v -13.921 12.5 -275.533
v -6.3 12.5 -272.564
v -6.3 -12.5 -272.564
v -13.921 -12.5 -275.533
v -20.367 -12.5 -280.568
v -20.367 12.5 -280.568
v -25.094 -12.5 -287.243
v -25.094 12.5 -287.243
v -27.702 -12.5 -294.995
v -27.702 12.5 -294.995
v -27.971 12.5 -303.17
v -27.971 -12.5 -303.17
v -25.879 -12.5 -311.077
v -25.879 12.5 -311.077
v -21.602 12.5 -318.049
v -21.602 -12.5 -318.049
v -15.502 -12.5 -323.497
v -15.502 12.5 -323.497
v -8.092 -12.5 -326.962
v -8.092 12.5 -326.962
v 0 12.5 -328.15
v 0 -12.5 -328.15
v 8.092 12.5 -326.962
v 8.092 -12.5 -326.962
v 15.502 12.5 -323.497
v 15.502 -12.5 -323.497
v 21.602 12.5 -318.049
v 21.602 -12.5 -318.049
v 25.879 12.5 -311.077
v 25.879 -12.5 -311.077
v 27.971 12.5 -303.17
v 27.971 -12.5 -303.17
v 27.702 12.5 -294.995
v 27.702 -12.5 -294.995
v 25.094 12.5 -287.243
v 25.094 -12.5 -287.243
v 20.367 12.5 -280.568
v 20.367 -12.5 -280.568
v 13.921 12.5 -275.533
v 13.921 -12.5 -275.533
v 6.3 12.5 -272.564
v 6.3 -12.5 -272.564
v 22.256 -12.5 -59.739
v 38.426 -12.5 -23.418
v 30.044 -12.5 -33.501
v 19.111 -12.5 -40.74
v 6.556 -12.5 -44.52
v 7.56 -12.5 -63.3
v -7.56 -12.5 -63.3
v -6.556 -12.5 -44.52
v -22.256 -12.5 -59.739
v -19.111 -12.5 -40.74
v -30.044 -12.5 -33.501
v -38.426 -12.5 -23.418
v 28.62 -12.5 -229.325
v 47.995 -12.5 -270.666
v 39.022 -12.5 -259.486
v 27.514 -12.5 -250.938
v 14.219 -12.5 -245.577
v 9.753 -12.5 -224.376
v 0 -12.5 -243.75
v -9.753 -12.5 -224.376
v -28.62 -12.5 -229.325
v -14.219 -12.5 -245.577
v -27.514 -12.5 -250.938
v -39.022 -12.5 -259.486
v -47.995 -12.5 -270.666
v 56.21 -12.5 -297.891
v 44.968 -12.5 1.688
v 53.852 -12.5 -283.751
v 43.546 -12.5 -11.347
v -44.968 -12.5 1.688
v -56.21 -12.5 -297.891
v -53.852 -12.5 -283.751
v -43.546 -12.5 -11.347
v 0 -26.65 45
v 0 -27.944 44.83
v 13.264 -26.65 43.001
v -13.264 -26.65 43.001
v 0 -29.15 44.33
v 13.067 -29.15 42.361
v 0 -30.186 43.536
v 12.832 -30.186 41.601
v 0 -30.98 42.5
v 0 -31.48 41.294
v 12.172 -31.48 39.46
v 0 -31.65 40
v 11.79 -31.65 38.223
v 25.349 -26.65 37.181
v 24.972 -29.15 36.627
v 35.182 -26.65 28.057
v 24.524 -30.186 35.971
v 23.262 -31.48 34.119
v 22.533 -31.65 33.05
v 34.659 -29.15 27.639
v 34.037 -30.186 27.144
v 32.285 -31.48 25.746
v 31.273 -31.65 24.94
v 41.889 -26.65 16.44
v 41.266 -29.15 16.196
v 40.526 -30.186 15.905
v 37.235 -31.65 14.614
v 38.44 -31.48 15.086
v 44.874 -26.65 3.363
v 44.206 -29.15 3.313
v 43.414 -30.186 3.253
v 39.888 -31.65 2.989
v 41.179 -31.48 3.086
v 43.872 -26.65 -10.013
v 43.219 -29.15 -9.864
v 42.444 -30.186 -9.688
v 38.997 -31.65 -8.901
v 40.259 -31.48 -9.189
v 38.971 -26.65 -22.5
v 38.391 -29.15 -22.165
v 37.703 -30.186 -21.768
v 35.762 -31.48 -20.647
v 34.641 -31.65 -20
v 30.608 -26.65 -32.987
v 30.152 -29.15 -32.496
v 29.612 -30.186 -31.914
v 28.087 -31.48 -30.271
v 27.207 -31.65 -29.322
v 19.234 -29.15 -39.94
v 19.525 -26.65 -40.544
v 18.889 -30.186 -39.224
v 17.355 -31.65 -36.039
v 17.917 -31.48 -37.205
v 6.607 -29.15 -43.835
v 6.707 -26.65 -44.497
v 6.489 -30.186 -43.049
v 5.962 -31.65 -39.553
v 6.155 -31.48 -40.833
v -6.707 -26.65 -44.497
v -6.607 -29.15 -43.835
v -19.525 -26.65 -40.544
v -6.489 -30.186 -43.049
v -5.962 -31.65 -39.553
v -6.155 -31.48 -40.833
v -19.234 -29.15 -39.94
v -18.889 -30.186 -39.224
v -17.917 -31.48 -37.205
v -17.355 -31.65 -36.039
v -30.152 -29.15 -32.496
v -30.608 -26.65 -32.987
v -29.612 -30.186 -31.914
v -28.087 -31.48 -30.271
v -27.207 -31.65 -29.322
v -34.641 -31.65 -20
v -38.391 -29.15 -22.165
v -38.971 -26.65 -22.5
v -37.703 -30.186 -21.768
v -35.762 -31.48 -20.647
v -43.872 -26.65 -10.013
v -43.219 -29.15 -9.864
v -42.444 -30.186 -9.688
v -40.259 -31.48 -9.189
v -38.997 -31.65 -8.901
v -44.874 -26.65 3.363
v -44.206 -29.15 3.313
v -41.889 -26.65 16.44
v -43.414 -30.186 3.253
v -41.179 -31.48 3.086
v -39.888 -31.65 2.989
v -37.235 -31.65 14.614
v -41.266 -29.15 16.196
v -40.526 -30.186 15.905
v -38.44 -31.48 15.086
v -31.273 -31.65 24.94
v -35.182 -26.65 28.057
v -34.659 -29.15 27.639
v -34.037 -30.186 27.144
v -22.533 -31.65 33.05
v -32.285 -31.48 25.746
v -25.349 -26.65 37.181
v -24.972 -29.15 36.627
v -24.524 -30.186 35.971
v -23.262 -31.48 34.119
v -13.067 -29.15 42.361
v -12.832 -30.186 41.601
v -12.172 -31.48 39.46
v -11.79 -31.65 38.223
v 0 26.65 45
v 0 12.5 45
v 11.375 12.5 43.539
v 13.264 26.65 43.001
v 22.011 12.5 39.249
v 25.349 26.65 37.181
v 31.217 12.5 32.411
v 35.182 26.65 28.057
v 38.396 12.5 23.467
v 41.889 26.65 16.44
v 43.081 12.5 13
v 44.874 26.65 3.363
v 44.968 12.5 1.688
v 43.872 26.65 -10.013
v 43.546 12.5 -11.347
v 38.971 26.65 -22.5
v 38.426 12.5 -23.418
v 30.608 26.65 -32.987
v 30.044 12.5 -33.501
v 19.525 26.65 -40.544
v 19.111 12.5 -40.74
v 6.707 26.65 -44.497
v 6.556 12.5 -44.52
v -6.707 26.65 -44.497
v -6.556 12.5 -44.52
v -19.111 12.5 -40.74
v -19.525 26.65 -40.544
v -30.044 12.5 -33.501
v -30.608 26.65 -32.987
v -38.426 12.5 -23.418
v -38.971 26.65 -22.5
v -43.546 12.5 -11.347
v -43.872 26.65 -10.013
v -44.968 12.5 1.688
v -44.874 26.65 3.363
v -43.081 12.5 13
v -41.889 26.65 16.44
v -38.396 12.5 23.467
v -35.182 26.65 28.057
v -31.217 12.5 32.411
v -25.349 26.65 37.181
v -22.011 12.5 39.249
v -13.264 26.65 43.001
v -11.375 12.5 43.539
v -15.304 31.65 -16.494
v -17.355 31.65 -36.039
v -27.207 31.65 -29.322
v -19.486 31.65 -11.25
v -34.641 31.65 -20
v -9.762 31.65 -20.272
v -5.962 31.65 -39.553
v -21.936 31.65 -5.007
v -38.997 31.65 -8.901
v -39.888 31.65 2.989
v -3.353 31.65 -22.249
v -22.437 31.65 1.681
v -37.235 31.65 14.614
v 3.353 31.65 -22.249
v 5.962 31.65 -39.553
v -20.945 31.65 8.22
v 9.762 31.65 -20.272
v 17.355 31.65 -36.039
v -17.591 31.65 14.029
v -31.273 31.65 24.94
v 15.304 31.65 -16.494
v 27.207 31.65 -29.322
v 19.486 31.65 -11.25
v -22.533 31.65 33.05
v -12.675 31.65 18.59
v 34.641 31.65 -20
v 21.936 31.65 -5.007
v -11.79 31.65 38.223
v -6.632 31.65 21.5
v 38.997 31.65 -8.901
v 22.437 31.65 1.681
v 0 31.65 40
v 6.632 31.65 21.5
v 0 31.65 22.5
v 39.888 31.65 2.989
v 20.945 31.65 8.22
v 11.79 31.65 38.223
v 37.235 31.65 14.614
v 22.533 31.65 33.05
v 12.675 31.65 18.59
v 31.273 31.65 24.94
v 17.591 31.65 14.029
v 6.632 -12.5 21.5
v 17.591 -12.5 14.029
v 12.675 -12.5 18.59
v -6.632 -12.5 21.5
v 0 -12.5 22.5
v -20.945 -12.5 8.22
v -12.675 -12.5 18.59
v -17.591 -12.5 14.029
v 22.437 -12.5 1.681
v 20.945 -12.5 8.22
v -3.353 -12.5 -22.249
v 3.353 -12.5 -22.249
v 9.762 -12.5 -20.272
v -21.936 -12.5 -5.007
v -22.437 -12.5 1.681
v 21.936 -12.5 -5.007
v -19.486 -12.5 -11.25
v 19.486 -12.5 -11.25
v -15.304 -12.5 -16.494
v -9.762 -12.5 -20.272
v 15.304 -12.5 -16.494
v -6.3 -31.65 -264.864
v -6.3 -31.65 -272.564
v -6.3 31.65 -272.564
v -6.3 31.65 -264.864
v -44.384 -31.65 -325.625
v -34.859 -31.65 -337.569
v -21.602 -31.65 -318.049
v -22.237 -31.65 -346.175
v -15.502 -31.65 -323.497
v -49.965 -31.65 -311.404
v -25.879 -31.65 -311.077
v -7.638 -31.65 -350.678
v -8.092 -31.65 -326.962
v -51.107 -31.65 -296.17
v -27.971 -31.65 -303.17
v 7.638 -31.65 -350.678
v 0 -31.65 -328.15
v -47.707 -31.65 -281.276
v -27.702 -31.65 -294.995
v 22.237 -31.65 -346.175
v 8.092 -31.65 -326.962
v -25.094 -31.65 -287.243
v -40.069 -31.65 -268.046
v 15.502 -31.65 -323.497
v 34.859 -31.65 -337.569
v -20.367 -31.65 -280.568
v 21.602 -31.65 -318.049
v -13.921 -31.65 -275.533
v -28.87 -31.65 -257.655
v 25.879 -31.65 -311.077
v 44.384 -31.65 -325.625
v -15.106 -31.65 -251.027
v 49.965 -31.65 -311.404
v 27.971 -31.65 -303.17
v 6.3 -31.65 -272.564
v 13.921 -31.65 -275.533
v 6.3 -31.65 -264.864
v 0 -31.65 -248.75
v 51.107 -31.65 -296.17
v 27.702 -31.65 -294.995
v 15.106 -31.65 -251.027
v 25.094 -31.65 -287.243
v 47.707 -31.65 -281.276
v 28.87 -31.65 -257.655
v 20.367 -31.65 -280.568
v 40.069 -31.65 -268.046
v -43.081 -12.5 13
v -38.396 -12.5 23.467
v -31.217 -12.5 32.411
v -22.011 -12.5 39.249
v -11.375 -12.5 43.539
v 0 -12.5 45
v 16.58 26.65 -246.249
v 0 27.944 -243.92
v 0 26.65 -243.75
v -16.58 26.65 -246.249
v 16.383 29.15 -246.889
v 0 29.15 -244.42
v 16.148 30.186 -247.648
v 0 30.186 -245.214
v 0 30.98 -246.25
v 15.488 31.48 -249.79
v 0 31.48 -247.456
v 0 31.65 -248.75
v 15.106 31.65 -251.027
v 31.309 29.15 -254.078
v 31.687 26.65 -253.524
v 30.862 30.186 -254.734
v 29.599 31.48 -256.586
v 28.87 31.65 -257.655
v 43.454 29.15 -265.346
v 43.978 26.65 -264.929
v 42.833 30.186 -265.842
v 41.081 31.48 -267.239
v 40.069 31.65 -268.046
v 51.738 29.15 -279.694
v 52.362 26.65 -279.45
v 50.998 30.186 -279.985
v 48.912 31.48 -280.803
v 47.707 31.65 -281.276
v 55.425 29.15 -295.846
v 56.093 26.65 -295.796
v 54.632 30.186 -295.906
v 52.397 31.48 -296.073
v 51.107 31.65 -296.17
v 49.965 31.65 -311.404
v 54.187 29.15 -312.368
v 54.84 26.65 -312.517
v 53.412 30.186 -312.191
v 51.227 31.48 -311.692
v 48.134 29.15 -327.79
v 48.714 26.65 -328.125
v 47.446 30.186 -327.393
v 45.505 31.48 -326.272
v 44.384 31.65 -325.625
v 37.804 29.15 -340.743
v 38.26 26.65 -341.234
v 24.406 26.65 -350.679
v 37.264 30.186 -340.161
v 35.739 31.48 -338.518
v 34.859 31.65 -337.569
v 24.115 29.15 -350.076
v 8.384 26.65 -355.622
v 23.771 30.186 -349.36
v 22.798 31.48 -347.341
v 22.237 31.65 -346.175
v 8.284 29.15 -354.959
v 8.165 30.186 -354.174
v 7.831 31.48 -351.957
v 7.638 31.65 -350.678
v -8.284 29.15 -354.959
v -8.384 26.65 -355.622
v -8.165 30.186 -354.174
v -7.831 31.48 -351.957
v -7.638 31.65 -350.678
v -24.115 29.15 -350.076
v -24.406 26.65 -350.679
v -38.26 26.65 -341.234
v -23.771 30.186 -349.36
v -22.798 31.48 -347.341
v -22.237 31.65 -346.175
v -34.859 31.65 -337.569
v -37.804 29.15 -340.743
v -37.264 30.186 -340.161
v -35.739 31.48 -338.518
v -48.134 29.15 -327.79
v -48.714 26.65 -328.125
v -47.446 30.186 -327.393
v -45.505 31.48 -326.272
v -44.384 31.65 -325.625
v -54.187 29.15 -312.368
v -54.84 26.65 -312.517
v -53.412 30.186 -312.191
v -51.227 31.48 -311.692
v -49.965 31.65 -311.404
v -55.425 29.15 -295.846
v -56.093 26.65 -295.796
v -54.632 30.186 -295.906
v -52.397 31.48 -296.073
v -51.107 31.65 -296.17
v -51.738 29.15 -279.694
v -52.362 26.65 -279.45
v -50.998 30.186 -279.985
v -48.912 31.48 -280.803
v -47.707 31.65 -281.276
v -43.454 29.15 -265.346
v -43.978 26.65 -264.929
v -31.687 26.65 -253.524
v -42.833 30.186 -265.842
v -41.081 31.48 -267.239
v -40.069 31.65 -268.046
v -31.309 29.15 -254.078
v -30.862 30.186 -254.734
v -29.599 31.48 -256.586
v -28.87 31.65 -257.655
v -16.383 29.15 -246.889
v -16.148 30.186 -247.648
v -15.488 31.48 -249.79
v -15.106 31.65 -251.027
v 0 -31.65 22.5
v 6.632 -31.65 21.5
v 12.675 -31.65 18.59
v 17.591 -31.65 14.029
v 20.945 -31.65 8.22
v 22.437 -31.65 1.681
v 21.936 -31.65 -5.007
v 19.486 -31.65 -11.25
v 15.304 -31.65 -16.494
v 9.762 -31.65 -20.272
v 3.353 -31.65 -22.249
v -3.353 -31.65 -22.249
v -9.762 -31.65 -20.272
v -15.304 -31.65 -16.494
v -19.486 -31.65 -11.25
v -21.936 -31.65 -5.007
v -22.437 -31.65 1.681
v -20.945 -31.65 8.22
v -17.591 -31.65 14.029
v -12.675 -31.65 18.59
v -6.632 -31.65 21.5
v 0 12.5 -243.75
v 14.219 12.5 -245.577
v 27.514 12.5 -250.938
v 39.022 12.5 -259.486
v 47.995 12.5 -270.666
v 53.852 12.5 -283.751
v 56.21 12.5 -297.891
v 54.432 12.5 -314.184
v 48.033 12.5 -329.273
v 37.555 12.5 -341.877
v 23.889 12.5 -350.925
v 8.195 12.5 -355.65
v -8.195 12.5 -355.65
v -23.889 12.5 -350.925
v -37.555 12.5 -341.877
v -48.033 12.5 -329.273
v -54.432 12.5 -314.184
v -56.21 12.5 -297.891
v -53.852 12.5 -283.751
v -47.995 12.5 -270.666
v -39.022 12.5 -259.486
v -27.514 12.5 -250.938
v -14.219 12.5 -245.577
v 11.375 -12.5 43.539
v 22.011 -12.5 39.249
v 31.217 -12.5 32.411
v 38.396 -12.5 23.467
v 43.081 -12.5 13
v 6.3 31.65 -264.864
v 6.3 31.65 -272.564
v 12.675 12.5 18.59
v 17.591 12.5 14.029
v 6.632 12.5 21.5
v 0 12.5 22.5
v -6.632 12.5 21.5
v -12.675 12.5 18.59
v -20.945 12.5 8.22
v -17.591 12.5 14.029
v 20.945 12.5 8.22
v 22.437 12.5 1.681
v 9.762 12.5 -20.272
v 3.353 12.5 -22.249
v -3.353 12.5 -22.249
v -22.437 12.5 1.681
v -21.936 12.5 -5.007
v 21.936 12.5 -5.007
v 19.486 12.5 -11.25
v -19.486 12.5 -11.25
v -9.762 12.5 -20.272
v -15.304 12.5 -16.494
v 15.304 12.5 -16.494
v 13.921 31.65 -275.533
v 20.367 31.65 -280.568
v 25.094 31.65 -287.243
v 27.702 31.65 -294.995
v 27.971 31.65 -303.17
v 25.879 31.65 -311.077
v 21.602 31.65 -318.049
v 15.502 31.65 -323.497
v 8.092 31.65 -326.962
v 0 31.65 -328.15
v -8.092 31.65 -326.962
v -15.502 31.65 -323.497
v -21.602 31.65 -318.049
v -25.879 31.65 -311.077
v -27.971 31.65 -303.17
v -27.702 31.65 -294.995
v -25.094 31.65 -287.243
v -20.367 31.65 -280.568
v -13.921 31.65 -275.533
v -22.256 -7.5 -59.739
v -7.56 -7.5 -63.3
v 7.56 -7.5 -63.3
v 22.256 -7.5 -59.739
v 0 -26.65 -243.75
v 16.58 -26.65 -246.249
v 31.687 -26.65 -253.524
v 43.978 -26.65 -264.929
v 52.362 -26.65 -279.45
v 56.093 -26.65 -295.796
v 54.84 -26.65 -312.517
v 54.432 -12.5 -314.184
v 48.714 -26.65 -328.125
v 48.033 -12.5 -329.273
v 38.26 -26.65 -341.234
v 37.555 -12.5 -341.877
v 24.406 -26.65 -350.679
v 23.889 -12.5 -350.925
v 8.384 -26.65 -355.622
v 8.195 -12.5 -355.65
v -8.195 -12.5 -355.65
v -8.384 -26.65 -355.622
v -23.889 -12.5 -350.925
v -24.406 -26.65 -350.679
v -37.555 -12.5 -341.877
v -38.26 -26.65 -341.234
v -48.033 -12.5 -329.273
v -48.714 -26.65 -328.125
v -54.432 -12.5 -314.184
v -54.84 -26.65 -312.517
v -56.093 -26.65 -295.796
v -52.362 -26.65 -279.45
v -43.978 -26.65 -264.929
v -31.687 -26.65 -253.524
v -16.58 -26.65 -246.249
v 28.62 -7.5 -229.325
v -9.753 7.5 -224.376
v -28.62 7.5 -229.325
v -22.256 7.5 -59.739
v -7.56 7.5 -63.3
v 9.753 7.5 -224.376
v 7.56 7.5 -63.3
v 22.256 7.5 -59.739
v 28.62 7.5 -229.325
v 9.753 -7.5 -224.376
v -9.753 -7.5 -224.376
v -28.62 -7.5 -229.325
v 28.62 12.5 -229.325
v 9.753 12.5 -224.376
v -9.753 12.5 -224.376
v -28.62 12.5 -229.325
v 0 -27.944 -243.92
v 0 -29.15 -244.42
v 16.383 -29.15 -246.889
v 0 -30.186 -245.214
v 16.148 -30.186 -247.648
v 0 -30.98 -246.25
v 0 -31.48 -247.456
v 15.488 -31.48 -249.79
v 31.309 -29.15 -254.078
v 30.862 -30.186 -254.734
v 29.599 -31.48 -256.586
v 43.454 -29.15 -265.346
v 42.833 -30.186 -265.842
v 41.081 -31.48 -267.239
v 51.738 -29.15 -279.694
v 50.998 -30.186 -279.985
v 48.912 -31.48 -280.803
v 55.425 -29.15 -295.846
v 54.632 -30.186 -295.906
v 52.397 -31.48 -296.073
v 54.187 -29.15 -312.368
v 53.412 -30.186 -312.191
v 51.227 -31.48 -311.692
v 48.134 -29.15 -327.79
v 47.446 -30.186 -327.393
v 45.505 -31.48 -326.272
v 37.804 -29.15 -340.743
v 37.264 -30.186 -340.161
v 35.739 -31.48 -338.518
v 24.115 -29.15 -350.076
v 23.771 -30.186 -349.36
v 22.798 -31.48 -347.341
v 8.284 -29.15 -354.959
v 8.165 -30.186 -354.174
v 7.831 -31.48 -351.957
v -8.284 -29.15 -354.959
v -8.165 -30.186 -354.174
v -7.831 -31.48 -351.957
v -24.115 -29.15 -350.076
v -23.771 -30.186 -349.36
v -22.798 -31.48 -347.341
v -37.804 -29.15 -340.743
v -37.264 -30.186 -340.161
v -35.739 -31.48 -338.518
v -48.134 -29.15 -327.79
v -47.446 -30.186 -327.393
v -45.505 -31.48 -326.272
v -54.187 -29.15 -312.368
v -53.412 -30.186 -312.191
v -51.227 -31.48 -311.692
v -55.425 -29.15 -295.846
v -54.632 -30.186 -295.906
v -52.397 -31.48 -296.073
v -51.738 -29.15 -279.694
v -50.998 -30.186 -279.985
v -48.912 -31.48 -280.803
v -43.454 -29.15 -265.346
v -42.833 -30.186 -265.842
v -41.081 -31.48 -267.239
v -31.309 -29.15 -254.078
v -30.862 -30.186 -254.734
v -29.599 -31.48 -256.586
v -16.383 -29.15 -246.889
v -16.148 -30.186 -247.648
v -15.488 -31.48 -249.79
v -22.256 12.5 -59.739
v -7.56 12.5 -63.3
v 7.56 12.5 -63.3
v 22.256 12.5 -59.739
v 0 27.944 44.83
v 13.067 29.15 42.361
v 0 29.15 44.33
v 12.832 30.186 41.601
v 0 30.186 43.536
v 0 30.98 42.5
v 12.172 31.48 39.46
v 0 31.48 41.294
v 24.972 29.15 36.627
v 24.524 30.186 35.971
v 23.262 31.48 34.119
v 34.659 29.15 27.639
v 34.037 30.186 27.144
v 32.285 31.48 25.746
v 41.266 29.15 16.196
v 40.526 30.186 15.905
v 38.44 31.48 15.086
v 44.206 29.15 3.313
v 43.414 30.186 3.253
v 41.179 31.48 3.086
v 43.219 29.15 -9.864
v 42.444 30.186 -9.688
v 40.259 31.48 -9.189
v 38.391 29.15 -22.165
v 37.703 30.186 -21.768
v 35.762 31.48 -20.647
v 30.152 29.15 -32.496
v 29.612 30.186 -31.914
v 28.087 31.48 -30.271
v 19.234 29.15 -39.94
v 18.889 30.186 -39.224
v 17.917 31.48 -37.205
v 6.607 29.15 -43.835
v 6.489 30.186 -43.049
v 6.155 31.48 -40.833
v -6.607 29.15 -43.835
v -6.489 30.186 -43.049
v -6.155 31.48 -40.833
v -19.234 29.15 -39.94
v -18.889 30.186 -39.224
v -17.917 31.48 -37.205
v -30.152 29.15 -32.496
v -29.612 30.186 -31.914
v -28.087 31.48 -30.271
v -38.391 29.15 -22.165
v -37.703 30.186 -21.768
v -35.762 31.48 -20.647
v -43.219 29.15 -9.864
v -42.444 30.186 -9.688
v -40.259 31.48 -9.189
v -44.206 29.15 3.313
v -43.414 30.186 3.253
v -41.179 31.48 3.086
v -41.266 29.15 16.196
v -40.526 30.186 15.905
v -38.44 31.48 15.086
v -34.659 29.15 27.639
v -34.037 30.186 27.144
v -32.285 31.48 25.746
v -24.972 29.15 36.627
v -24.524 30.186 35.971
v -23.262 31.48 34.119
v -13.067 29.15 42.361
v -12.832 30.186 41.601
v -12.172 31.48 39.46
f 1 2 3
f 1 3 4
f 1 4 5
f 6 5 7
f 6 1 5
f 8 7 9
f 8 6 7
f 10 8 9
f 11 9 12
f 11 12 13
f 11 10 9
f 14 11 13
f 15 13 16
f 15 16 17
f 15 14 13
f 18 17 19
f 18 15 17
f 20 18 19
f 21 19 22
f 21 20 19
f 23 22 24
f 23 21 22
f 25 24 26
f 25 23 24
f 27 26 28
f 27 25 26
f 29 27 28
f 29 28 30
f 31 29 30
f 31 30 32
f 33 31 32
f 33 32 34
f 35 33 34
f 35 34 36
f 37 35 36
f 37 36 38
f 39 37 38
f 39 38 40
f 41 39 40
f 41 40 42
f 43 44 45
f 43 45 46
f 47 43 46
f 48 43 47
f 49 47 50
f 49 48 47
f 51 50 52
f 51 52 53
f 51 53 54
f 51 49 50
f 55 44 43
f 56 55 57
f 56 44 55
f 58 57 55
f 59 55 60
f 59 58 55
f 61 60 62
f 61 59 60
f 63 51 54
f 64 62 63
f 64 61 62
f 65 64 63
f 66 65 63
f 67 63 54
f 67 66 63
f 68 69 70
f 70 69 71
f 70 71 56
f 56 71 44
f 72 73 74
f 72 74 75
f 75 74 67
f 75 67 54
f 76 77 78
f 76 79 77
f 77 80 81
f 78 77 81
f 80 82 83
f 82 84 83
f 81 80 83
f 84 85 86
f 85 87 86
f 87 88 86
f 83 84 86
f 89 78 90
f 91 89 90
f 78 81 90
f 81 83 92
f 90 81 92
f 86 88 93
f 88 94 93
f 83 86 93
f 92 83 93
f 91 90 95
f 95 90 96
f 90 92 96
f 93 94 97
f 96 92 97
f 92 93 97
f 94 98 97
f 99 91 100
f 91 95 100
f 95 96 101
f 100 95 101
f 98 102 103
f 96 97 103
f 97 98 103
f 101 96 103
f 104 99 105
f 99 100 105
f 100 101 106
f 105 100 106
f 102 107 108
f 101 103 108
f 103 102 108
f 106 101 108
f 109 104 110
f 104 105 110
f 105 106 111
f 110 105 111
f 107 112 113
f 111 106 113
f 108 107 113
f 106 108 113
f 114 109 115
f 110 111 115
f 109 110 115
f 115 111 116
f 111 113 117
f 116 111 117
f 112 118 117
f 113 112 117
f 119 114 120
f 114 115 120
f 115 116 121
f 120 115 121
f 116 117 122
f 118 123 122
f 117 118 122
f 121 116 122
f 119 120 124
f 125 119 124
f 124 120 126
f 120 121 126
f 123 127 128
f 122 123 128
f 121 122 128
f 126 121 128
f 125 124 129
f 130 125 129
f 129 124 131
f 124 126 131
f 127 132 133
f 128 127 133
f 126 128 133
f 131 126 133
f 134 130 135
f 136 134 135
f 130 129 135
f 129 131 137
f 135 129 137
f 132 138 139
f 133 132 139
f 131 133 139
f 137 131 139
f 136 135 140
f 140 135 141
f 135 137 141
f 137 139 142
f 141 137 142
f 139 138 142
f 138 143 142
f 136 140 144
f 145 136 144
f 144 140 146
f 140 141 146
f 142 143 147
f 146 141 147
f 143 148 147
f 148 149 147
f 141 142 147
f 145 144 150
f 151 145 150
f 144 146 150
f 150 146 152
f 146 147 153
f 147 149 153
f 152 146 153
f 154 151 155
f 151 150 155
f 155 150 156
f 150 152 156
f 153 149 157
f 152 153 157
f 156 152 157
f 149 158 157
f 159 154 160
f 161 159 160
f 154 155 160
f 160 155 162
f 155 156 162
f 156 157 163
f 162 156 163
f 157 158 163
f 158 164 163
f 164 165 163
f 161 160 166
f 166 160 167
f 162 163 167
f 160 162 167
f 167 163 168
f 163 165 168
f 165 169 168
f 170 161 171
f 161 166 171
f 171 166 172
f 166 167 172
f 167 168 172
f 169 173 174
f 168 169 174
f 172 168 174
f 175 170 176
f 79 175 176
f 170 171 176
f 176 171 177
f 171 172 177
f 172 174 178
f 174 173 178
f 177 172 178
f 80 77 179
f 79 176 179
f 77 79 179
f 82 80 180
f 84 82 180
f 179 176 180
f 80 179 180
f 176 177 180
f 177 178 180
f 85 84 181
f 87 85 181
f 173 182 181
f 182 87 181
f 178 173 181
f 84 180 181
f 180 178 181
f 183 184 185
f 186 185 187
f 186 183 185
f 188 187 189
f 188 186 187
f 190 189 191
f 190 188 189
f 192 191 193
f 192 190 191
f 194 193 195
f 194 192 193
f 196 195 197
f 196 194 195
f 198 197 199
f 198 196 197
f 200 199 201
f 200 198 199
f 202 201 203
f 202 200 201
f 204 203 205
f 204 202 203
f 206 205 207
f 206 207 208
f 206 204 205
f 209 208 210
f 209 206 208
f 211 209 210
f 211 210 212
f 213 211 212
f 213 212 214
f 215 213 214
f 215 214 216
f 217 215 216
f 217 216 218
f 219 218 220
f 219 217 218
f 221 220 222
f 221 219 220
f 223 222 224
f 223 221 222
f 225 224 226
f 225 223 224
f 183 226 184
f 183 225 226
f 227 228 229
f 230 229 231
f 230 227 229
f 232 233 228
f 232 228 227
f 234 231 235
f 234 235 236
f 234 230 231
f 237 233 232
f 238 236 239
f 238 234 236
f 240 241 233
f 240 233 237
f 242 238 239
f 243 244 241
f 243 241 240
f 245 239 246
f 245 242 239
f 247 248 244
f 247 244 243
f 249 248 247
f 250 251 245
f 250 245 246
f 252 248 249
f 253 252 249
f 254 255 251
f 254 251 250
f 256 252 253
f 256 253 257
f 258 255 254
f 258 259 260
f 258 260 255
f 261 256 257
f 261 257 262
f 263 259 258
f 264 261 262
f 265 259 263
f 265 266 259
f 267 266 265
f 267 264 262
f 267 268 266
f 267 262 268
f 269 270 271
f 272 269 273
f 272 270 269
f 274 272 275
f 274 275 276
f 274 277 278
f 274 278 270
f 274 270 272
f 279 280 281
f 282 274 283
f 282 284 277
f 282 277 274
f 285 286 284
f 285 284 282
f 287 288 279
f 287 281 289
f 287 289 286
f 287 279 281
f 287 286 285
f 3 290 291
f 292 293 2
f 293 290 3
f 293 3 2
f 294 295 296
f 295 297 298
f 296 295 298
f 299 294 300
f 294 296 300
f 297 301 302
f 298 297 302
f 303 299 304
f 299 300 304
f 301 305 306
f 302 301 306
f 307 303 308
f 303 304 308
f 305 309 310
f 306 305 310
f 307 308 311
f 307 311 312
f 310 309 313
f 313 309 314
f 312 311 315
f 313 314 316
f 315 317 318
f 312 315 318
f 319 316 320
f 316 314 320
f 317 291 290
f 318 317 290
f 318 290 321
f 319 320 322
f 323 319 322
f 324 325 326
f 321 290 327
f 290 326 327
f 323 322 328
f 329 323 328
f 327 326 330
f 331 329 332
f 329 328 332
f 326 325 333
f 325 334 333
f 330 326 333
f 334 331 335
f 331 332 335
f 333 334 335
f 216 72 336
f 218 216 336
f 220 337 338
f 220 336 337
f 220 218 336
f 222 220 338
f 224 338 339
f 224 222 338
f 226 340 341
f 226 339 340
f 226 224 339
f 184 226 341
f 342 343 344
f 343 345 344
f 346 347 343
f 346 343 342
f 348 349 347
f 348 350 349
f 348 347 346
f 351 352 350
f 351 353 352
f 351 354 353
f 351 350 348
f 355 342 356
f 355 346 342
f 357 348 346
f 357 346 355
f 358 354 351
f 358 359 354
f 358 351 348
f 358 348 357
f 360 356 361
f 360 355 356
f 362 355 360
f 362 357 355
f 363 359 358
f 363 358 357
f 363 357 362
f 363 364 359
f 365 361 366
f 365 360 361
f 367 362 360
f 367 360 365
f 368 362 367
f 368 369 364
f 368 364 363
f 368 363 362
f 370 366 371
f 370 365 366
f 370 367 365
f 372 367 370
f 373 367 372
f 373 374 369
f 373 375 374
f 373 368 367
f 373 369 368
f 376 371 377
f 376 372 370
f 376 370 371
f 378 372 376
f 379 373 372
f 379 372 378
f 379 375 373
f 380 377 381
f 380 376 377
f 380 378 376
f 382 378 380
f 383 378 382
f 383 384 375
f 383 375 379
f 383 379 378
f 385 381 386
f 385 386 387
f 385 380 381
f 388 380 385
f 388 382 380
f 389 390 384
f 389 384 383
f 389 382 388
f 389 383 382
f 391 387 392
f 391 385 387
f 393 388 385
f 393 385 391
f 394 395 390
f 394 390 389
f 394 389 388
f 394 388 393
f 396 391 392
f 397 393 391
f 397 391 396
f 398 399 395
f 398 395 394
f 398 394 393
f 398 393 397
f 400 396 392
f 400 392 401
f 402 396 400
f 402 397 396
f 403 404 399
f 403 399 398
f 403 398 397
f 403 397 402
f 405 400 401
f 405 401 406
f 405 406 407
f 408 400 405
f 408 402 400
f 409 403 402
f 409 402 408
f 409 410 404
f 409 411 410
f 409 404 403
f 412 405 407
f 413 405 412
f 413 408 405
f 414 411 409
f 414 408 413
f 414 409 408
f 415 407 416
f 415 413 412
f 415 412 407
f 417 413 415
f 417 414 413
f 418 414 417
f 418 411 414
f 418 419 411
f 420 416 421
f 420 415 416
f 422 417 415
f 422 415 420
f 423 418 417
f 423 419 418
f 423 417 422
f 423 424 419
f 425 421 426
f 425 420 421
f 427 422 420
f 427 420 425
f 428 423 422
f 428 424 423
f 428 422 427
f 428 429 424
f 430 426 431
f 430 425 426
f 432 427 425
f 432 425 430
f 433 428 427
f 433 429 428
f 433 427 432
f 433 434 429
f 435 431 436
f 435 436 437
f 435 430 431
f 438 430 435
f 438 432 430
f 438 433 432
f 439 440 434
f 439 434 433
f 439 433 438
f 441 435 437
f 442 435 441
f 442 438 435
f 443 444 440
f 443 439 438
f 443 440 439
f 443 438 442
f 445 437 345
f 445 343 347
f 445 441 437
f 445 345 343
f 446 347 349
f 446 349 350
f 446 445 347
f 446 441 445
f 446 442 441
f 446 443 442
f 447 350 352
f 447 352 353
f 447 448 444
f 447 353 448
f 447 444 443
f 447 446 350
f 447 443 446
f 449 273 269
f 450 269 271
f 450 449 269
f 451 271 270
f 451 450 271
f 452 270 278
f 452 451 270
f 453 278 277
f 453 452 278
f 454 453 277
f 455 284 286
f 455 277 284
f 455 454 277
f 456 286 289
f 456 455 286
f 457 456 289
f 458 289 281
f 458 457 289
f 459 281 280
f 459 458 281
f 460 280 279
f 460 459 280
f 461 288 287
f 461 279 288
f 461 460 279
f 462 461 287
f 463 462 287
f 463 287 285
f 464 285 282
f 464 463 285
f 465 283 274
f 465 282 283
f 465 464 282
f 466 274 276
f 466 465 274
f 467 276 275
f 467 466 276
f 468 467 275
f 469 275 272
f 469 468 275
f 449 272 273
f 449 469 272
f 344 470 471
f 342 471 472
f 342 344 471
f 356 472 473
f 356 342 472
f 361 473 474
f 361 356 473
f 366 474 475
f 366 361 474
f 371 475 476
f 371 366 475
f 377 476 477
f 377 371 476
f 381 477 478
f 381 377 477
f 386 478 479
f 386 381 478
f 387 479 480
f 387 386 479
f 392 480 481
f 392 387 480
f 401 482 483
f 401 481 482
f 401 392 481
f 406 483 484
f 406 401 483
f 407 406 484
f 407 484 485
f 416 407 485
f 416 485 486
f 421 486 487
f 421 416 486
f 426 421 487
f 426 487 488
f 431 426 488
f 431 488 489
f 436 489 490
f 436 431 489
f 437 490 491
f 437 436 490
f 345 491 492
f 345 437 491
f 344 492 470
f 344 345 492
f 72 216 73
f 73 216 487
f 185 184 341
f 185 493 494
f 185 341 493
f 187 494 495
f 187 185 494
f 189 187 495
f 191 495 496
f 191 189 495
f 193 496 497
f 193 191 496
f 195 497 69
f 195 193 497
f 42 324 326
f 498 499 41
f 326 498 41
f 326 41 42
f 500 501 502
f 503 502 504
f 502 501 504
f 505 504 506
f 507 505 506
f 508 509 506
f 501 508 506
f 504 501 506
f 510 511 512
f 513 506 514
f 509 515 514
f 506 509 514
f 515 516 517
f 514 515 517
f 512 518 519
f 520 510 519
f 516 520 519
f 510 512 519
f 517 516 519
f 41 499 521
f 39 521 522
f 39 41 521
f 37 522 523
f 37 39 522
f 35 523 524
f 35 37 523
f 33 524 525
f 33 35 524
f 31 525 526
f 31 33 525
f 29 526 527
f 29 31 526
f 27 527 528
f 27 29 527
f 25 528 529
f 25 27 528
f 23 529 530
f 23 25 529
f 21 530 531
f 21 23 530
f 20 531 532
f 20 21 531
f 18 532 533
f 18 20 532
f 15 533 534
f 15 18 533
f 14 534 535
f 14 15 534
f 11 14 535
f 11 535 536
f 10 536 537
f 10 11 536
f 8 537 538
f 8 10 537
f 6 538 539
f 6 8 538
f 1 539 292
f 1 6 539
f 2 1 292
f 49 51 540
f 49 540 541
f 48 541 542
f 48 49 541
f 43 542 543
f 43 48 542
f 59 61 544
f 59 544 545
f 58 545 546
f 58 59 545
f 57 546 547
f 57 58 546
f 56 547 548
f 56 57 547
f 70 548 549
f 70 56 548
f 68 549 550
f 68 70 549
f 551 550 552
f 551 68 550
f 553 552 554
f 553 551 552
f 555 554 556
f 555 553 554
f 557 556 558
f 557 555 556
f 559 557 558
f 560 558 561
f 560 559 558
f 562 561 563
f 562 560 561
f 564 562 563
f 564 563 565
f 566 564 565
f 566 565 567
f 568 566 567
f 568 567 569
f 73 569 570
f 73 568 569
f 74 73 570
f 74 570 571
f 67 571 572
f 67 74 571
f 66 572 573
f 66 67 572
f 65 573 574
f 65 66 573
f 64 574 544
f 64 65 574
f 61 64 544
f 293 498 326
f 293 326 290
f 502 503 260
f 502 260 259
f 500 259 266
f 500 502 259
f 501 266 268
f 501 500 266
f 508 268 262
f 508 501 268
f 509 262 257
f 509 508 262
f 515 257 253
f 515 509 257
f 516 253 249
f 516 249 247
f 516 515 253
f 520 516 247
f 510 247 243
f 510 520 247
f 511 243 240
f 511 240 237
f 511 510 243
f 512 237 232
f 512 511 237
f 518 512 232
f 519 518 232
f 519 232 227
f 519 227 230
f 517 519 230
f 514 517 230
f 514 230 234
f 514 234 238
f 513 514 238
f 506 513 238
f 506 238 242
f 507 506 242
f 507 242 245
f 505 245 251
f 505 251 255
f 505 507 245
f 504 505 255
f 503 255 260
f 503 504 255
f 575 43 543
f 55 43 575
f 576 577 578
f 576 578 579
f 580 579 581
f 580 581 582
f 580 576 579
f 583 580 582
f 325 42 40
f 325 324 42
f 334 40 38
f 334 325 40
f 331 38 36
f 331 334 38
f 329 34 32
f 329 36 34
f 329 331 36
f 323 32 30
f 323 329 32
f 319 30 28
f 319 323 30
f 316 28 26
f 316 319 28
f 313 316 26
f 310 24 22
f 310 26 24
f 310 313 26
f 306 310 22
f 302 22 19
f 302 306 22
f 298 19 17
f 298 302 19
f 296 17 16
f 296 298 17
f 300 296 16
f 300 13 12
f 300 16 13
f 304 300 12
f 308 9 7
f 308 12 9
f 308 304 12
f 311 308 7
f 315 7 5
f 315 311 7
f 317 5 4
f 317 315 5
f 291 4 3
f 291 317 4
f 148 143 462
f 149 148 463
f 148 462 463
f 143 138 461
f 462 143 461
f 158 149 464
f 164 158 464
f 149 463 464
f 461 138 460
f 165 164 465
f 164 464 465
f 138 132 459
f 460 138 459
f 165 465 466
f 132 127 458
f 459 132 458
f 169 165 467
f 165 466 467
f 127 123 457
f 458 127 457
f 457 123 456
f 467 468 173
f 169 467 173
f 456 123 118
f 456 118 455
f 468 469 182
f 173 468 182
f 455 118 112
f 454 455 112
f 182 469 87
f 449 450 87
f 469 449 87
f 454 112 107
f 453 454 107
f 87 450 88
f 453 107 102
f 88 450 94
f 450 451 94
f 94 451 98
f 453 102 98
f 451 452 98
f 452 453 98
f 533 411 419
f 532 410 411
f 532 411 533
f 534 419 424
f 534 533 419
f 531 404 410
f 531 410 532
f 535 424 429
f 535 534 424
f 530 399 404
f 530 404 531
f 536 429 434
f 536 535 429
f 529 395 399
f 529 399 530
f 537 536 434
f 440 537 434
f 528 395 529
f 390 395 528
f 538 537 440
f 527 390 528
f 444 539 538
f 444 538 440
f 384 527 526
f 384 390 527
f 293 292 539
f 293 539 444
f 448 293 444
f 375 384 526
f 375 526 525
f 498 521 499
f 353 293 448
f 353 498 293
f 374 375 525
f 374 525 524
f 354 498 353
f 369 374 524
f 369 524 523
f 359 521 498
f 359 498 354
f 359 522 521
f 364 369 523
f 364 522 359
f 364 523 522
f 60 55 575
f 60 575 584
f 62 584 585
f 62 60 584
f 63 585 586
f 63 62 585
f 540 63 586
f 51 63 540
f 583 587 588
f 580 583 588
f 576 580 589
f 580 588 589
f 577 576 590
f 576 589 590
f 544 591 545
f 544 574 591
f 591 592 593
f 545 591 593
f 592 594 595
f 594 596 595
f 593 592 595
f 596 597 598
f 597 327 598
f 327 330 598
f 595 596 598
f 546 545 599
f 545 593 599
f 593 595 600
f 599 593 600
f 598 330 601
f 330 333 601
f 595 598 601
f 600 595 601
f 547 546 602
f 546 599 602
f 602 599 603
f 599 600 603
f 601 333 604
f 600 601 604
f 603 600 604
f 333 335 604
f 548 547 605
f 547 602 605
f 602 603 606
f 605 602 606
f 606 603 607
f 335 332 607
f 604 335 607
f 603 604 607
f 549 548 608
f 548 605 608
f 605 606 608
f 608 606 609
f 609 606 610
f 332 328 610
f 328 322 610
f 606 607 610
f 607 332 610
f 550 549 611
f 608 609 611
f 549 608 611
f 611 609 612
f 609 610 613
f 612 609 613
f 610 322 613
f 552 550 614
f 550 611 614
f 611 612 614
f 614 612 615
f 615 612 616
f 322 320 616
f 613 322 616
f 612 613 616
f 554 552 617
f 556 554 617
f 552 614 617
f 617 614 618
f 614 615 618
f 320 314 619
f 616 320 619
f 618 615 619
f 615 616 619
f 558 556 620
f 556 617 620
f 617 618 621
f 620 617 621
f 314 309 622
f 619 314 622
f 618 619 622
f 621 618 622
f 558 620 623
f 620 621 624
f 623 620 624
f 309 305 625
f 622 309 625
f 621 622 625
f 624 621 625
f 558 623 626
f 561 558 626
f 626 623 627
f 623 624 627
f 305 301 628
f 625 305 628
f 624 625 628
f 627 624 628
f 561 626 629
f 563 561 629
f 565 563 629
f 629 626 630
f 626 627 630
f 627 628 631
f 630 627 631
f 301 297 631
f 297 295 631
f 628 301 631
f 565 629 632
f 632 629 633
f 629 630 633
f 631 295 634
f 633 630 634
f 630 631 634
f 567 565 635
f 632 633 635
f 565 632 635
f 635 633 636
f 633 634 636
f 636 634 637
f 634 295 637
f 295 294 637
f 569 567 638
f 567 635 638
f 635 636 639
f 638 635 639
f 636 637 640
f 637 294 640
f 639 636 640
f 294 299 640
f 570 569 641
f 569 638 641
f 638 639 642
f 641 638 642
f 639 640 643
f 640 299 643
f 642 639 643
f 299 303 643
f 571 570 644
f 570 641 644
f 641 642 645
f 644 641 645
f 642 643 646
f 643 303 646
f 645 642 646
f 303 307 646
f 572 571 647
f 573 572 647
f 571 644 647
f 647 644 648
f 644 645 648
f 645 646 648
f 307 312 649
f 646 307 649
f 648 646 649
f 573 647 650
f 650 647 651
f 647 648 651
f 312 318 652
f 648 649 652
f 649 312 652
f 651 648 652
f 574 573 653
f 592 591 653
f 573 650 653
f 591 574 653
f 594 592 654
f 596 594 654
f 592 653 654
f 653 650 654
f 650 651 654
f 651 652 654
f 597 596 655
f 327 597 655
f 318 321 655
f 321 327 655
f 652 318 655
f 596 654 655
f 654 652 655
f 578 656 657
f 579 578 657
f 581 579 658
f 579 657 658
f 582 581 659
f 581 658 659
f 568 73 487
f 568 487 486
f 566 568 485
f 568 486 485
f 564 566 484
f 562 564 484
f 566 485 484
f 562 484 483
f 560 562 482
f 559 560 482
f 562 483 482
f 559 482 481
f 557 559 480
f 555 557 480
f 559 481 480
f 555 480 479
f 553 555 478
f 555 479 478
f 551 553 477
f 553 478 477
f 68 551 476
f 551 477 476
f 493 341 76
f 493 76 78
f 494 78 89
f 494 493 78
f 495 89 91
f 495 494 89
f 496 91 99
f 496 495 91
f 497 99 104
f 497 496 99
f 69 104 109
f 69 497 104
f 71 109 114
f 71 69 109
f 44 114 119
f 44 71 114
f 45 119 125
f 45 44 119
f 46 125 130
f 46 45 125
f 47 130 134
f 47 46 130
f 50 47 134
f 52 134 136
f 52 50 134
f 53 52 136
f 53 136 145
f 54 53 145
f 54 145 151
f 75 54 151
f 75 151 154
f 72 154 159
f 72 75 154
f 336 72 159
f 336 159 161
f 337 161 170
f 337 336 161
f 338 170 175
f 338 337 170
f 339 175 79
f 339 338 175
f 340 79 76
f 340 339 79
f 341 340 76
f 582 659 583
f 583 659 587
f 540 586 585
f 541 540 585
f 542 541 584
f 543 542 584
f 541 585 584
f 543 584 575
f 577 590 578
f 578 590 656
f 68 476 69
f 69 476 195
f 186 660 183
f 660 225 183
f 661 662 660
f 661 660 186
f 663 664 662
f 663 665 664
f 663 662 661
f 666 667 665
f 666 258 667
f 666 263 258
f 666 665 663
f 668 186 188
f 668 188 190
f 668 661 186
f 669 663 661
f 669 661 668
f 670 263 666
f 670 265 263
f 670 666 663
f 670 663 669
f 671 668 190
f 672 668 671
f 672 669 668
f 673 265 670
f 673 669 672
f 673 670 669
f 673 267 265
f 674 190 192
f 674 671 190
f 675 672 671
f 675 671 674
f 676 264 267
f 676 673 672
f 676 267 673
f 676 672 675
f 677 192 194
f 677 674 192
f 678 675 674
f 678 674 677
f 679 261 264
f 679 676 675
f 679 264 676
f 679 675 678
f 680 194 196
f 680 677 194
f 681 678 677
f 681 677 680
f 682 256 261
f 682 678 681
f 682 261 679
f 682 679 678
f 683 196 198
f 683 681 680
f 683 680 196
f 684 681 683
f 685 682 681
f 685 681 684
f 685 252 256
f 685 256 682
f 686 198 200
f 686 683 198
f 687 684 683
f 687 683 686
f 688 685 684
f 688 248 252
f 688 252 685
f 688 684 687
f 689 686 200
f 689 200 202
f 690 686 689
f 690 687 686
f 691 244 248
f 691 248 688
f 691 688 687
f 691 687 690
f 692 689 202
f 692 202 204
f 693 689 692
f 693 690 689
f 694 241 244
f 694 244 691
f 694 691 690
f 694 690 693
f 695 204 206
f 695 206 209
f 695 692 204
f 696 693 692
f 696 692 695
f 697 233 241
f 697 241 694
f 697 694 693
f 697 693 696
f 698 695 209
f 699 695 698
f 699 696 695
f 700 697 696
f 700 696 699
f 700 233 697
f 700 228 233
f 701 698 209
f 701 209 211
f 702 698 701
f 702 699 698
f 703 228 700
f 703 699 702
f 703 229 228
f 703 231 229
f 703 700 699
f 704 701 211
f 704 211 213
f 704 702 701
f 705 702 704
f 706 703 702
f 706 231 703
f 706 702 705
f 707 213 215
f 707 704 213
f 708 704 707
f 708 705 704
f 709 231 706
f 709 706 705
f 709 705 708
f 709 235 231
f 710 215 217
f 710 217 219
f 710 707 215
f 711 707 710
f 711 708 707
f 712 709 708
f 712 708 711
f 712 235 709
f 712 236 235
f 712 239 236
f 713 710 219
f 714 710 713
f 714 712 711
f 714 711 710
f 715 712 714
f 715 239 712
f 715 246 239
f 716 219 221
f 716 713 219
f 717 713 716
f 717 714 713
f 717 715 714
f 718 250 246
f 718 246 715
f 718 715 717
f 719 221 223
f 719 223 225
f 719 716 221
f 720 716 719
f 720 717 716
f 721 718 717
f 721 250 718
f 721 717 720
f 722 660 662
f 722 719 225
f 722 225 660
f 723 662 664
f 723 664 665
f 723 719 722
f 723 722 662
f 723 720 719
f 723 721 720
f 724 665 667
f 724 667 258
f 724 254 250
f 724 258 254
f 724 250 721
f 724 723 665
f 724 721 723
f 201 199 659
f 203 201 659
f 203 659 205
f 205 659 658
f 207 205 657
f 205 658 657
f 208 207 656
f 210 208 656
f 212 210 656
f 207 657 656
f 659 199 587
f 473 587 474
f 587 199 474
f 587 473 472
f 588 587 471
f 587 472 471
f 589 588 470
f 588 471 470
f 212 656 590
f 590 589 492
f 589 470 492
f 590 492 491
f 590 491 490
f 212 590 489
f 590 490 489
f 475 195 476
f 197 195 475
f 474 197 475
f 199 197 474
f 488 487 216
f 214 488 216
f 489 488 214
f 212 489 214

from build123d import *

# Parameters (mm, degrees)
SKETCH1_R             = 45
SKETCH1_R_2           = 22.5
BOSS_EXTRUDE1_DEPTH   = 31.65
SKETCH1_R_3           = 56.25
SKETCH1_R_4           = 28.15
BOSS_EXTRUDE1_2_DEPTH = 31.65
BOSS_EXTRUDE2_DEPTH   = 12.5
CUT_EXTRUDE1_DEPTH    = 5
CUT_EXTRUDE2_DEPTH    = 367.176207583
FILLET1_R             = 5


with BuildPart() as part:
    # Sketch1 → Boss-Extrude1 (new, symmetric)
    with BuildSketch(Plane(origin=(0, 0, 0), x_dir=(1, 0, 0), z_dir=(0, 1, 0))):
        with Locations(Location((0, 0, 0), (0, 0, 270))):
            Circle(SKETCH1_R)
        with Locations(Location((0, 0, 0), (0, 0, 270))):
            Circle(SKETCH1_R_2, mode=Mode.SUBTRACT)
    extrude(amount=BOSS_EXTRUDE1_DEPTH, both=True)



with BuildPart() as body_2:
    # Sketch1 → Boss-Extrude1 2 (new, symmetric)
    with BuildSketch(Plane(origin=(0, 0, 0), x_dir=(1, 0, 0), z_dir=(0, 1, 0))):
        with Locations(Location((0, 300, 0), (0, 0, 270))):
            Circle(SKETCH1_R_3)
        with Locations(Location((0, 300, 0), (0, 0, 270))):
            Circle(SKETCH1_R_4, mode=Mode.SUBTRACT)
    extrude(amount=BOSS_EXTRUDE1_2_DEPTH, both=True)


with BuildPart() as part_1:
    add(part.part)

    add(body_2.part)  # Boss-Extrude2 merges body 2
    # Sketch2 → Boss-Extrude2 (add, symmetric)
    with BuildSketch(Plane(origin=(0, 0, 0), x_dir=(1, 0, 0), z_dir=(0, 1, 0))):
        with BuildLine():
            Line((56.210435304, 297.890625), (44.968348244, -1.6875))
            ThreePointArc((44.968348244, -1.6875), (0, -45), (-44.968348244, -1.6875))
            Line((-44.968348244, -1.6875), (-56.210435304, 297.890625))
            ThreePointArc((-56.210435304, 297.890625), (0, 356.25), (56.210435304, 297.890625))
        make_face()
    extrude(amount=BOSS_EXTRUDE2_DEPTH, both=True)

    # Sketch3 → Cut-Extrude1 (cut)
    with BuildSketch(Plane(origin=(0, 12.5, 0), x_dir=(1, 0, 0), z_dir=(0, 1, 0))):
        with BuildLine():
            Line((22.255863805, 59.73892388), (28.619814412, 229.324907336))
            ThreePointArc((28.619814412, 229.324907336), (0, 223.75), (-28.619814412, 229.324907336))
            Line((-28.619814412, 229.324907336), (-22.255863805, 59.73892388))
            ThreePointArc((-22.255863805, 59.73892388), (0, 63.75), (22.255863805, 59.73892388))
        make_face()
    cut_extrude1 = extrude(amount=-CUT_EXTRUDE1_DEPTH, mode=Mode.SUBTRACT)

    # Mirror1: Cut-Extrude1 across plane
    add(cut_extrude1.mirror(Plane.ZX), mode=Mode.SUBTRACT)

    # Sketch4 → Cut-Extrude2 (cut, through all)
    with BuildSketch(Plane(origin=(0, 31.65, 0), x_dir=(1, 0, 0), z_dir=(0, 1, 0))):
        with BuildLine():
            Line((6.3, 272.564029086), (6.3, 264.864029086))
            Line((6.3, 264.864029086), (-6.3, 264.864029086))
            Line((-6.3, 264.864029086), (-6.3, 272.564029086))
            ThreePointArc((-6.3, 272.564029086), (0, 328.15), (6.3, 272.564029086))
        make_face()
    extrude(amount=-CUT_EXTRUDE2_DEPTH, mode=Mode.SUBTRACT)

    # Fillet1
    fillet1_edges = [part_1.edges().sort_by_distance(p)[0] for p in [
        (0, -31.65, -45),
        (0, -31.65, -356.25),
        (0, 31.65, -356.25),
        (0, 31.65, -45),
    ]]
    fillet(fillet1_edges, radius=FILLET1_R)


solid = part_1.part
